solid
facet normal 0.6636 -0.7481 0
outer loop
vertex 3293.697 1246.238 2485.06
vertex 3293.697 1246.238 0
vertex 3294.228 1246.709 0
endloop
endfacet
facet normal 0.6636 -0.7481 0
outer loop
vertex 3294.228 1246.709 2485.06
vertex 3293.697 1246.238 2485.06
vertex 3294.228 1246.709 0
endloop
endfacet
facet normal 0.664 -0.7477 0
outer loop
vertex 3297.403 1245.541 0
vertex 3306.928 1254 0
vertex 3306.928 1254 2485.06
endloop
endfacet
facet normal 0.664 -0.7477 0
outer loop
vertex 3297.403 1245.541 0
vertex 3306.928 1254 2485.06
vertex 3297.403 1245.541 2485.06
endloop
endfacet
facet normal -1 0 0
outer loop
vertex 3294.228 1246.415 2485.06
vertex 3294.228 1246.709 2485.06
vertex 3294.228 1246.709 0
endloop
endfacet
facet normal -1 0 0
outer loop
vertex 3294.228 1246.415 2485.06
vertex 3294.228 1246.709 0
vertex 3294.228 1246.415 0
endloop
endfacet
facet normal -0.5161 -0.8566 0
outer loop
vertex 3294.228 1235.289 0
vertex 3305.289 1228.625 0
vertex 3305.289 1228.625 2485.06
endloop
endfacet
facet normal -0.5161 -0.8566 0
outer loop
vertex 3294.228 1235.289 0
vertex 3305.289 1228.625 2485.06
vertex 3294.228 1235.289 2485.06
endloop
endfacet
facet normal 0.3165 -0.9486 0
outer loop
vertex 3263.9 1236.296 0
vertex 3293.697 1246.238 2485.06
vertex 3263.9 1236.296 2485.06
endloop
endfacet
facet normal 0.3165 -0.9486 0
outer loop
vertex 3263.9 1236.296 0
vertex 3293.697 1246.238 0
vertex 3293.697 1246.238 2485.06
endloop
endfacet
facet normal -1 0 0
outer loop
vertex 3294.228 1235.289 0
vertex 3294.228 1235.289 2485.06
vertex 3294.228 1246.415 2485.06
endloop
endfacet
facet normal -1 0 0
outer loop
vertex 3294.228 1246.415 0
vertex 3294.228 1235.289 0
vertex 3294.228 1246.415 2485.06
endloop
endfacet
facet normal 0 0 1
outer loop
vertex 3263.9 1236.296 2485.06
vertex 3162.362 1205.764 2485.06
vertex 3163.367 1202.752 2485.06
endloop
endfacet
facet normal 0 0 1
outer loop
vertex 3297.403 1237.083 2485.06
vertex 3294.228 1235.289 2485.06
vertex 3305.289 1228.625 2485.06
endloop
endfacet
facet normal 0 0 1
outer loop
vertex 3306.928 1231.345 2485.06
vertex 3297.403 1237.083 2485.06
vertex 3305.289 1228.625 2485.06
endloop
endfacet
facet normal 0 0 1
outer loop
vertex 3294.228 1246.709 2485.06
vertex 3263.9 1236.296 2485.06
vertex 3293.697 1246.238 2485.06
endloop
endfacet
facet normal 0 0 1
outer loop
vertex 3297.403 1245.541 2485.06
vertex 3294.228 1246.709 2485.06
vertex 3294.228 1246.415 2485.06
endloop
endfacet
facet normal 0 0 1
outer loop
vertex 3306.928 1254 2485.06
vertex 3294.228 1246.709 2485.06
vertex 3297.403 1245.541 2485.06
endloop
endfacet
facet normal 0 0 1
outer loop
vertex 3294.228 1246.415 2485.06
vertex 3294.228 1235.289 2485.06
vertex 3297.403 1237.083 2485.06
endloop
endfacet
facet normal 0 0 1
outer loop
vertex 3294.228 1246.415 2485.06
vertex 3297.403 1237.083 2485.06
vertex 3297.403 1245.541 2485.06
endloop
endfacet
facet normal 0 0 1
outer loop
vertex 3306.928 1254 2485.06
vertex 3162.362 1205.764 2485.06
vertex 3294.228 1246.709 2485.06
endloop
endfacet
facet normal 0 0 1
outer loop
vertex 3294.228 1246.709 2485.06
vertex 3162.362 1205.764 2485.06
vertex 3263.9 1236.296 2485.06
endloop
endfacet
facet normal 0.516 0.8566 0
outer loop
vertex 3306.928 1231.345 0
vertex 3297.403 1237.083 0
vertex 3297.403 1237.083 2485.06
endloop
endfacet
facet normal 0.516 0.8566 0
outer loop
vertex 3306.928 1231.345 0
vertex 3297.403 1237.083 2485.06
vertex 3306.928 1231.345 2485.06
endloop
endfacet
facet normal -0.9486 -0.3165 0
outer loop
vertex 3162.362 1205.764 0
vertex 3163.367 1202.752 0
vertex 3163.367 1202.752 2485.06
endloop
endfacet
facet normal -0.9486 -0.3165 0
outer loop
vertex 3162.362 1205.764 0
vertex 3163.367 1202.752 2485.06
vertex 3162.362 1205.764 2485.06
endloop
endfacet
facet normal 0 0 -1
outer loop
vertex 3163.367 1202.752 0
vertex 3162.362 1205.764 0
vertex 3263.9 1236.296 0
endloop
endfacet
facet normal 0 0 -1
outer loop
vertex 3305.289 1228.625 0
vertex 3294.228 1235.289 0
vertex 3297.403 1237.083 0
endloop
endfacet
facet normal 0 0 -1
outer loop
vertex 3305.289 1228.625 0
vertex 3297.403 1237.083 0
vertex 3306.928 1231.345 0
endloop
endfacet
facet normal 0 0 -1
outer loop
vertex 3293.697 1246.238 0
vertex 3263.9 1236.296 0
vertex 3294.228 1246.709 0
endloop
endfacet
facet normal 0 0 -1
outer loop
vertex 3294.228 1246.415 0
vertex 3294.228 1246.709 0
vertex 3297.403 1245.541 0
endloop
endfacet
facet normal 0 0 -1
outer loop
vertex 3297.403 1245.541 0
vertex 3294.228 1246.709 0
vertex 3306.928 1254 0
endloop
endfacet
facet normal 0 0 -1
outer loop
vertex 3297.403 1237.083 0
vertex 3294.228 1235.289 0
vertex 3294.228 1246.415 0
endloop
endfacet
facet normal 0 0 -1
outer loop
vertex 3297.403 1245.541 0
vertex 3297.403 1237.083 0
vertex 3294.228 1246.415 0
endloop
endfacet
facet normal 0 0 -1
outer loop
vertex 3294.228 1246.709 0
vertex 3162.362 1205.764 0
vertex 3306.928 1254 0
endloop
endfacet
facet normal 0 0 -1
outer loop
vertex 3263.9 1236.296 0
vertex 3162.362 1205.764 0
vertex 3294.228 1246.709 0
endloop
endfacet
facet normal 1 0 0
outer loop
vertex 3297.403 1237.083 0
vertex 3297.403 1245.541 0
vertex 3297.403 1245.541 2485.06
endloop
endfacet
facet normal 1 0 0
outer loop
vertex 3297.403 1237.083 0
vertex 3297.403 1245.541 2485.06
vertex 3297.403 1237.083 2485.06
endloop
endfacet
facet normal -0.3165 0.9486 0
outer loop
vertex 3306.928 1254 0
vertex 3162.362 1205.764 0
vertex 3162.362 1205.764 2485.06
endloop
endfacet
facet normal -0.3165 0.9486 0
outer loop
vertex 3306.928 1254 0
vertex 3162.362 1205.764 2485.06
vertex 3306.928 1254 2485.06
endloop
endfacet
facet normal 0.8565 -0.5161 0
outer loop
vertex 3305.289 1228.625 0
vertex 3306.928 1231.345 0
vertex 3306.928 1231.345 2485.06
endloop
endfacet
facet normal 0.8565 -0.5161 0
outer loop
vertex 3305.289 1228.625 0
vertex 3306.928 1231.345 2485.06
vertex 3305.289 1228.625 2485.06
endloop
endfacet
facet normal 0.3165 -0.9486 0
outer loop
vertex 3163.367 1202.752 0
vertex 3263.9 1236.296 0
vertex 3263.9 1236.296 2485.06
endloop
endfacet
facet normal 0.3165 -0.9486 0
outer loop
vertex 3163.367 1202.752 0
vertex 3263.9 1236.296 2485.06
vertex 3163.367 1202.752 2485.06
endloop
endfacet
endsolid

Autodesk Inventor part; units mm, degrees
ref_plane "YZ Plane" through (0, 0, 0) normal (1, 0, 0) x (0, 1, 0)
ref_plane "XZ Plane" through (0, 0, 0) normal (0, 1, 0) x (-1, 0, 0)
ref_plane "XY Plane" through (0, 0, 0) normal (0, 0, 1) x (1, 0, 0)
sketch "Sketch1" plane through (0, 0, 0) normal (0, 0, 1) x (1, 0, 0)
  line L0 (0, 0) -> (3294.2276, 1099.144)
  line L1 (3294.2276, 1246.4151) -> (-135.0962, 102.1952)
  line L2 (0, 0) -> (-135.0962, 0)
  line L3 (-135.0962, 0) -> (-135.0962, 102.1952)
  line L4 (-135.0962, 102.1952) -> (1627.6312, 690.3426)
  line L5 (3294.2276, 1099.144) -> (3263.9, 1099.144)
  line L6 (3294.2276, 1099.144) -> (3294.2276, 1246.4151)
  line L7 (-88.9, 0) -> (-88.9, 117.6089)
  line L8 (3263.9, 1089.025) -> (3263.9, 1236.2961)
  line L9 (-135.0962, 102.1952) -> (-160.4962, 102.1952)
  line L10 (-160.4962, 102.1952) -> (-160.4962, 0)
  line L11 (-160.4962, 0) -> (-135.0962, 0)
  line L12 (-135.0962, 102.1952) -> (-140.1208, 117.2541)
  line L13 (-140.1208, 117.2541) -> (150.6173, 214.261)
  line L14 (150.6173, 214.261) -> (155.6418, 199.2021)
  line L15 (-27.6261, 154.7888) -> (-28.631, 157.8005)
  line L16 (-28.631, 157.8005) -> (-173.1962, 109.5652)
  line L17 (-173.1962, 109.5652) -> (-163.6712, 101.107)
  line L18 (-163.6712, 101.107) -> (-163.6712, 92.6488)
  line L19 (-163.6712, 92.6488) -> (-173.1962, 86.9102)
  line L20 (-171.5578, 84.1906) -> (-160.4962, 90.855)
  line L21 (-160.4962, 90.855) -> (-160.4962, 102.5338)
  line L22 (-160.4962, 102.5338) -> (-166.9808, 108.292)
  line L23 (-166.9808, 108.292) -> (-27.6261, 154.7888)
  line L24 (-171.5578, 84.1906) -> (-173.1962, 86.9102)
  line L25 (-173.1962, 109.5652) -> (-173.1962, 86.9102)
  line L26 (3163.3672, 1202.7525) -> (3162.3623, 1205.7643)
  line L27 (3162.3623, 1205.7643) -> (3306.9276, 1253.9996)
  line L28 (3163.3672, 1202.7525) -> (3293.697, 1246.2381)
  line L29 (3293.697, 1246.2381) -> (3294.2276, 1246.7092)
  line L30 (3306.9276, 1253.9996) -> (3297.4026, 1245.5414)
  line L31 (3297.4026, 1245.5414) -> (3297.4026, 1237.0832)
  line L32 (3294.2276, 1246.7092) -> (3294.2276, 1235.2894)
  line L33 (3297.4026, 1237.0832) -> (3306.9276, 1231.3446)
  line L34 (3306.9276, 1231.3446) -> (3305.2891, 1228.625)
  line L35 (3305.2891, 1228.625) -> (3294.2276, 1235.2894)
  line L36 (3306.9276, 1253.9996) -> (3306.9276, 1231.3446)
  point P0 (-160.4962, 90.855)
  point P1 (-160.4962, 101.4128)
  dimension "d5" = 139.7
  dimension "d17" = 88.9
  dimension "d19" = 3352.8
  dimension "d23" = 30.3276
  dimension "d28" = 46.1962
  dimension "d33" = 1089.025
  dimension "d36" = 25.4
  dimension "d37" = 15.875
  dimension "d49" = 3.175
  dimension "d50" = 3.175
  dimension "d51" = 3.175
  dimension "d52" = 3.175
  dimension "d54" = 8.4582
  dimension "d55" = 8.4582
  dimension "d61" = 8.4582
  dimension "d62" = 152.4
  dimension "d63" = 3.175
  dimension "d65" = 12.7
  dimension "d73" = 152.4
  dimension "d74" = 12.7
  dimension "d75" = 3.175
  dimension "d76" = 3.175
  dimension "d78" = 8.4582
  dimension "d79" = 8.4582
  dimension "d80" = 8.4582
extrude "Extrusion2" add sketch "Sketch1" along normal blind 2485.0598 contours L6 L32 L29 L1 L26 L27 L30 L31 L33 L34 L35
properties part number "Drip_Edge_For_Front_With_Length_97.504_Inches" material "Aluminum 6061"
